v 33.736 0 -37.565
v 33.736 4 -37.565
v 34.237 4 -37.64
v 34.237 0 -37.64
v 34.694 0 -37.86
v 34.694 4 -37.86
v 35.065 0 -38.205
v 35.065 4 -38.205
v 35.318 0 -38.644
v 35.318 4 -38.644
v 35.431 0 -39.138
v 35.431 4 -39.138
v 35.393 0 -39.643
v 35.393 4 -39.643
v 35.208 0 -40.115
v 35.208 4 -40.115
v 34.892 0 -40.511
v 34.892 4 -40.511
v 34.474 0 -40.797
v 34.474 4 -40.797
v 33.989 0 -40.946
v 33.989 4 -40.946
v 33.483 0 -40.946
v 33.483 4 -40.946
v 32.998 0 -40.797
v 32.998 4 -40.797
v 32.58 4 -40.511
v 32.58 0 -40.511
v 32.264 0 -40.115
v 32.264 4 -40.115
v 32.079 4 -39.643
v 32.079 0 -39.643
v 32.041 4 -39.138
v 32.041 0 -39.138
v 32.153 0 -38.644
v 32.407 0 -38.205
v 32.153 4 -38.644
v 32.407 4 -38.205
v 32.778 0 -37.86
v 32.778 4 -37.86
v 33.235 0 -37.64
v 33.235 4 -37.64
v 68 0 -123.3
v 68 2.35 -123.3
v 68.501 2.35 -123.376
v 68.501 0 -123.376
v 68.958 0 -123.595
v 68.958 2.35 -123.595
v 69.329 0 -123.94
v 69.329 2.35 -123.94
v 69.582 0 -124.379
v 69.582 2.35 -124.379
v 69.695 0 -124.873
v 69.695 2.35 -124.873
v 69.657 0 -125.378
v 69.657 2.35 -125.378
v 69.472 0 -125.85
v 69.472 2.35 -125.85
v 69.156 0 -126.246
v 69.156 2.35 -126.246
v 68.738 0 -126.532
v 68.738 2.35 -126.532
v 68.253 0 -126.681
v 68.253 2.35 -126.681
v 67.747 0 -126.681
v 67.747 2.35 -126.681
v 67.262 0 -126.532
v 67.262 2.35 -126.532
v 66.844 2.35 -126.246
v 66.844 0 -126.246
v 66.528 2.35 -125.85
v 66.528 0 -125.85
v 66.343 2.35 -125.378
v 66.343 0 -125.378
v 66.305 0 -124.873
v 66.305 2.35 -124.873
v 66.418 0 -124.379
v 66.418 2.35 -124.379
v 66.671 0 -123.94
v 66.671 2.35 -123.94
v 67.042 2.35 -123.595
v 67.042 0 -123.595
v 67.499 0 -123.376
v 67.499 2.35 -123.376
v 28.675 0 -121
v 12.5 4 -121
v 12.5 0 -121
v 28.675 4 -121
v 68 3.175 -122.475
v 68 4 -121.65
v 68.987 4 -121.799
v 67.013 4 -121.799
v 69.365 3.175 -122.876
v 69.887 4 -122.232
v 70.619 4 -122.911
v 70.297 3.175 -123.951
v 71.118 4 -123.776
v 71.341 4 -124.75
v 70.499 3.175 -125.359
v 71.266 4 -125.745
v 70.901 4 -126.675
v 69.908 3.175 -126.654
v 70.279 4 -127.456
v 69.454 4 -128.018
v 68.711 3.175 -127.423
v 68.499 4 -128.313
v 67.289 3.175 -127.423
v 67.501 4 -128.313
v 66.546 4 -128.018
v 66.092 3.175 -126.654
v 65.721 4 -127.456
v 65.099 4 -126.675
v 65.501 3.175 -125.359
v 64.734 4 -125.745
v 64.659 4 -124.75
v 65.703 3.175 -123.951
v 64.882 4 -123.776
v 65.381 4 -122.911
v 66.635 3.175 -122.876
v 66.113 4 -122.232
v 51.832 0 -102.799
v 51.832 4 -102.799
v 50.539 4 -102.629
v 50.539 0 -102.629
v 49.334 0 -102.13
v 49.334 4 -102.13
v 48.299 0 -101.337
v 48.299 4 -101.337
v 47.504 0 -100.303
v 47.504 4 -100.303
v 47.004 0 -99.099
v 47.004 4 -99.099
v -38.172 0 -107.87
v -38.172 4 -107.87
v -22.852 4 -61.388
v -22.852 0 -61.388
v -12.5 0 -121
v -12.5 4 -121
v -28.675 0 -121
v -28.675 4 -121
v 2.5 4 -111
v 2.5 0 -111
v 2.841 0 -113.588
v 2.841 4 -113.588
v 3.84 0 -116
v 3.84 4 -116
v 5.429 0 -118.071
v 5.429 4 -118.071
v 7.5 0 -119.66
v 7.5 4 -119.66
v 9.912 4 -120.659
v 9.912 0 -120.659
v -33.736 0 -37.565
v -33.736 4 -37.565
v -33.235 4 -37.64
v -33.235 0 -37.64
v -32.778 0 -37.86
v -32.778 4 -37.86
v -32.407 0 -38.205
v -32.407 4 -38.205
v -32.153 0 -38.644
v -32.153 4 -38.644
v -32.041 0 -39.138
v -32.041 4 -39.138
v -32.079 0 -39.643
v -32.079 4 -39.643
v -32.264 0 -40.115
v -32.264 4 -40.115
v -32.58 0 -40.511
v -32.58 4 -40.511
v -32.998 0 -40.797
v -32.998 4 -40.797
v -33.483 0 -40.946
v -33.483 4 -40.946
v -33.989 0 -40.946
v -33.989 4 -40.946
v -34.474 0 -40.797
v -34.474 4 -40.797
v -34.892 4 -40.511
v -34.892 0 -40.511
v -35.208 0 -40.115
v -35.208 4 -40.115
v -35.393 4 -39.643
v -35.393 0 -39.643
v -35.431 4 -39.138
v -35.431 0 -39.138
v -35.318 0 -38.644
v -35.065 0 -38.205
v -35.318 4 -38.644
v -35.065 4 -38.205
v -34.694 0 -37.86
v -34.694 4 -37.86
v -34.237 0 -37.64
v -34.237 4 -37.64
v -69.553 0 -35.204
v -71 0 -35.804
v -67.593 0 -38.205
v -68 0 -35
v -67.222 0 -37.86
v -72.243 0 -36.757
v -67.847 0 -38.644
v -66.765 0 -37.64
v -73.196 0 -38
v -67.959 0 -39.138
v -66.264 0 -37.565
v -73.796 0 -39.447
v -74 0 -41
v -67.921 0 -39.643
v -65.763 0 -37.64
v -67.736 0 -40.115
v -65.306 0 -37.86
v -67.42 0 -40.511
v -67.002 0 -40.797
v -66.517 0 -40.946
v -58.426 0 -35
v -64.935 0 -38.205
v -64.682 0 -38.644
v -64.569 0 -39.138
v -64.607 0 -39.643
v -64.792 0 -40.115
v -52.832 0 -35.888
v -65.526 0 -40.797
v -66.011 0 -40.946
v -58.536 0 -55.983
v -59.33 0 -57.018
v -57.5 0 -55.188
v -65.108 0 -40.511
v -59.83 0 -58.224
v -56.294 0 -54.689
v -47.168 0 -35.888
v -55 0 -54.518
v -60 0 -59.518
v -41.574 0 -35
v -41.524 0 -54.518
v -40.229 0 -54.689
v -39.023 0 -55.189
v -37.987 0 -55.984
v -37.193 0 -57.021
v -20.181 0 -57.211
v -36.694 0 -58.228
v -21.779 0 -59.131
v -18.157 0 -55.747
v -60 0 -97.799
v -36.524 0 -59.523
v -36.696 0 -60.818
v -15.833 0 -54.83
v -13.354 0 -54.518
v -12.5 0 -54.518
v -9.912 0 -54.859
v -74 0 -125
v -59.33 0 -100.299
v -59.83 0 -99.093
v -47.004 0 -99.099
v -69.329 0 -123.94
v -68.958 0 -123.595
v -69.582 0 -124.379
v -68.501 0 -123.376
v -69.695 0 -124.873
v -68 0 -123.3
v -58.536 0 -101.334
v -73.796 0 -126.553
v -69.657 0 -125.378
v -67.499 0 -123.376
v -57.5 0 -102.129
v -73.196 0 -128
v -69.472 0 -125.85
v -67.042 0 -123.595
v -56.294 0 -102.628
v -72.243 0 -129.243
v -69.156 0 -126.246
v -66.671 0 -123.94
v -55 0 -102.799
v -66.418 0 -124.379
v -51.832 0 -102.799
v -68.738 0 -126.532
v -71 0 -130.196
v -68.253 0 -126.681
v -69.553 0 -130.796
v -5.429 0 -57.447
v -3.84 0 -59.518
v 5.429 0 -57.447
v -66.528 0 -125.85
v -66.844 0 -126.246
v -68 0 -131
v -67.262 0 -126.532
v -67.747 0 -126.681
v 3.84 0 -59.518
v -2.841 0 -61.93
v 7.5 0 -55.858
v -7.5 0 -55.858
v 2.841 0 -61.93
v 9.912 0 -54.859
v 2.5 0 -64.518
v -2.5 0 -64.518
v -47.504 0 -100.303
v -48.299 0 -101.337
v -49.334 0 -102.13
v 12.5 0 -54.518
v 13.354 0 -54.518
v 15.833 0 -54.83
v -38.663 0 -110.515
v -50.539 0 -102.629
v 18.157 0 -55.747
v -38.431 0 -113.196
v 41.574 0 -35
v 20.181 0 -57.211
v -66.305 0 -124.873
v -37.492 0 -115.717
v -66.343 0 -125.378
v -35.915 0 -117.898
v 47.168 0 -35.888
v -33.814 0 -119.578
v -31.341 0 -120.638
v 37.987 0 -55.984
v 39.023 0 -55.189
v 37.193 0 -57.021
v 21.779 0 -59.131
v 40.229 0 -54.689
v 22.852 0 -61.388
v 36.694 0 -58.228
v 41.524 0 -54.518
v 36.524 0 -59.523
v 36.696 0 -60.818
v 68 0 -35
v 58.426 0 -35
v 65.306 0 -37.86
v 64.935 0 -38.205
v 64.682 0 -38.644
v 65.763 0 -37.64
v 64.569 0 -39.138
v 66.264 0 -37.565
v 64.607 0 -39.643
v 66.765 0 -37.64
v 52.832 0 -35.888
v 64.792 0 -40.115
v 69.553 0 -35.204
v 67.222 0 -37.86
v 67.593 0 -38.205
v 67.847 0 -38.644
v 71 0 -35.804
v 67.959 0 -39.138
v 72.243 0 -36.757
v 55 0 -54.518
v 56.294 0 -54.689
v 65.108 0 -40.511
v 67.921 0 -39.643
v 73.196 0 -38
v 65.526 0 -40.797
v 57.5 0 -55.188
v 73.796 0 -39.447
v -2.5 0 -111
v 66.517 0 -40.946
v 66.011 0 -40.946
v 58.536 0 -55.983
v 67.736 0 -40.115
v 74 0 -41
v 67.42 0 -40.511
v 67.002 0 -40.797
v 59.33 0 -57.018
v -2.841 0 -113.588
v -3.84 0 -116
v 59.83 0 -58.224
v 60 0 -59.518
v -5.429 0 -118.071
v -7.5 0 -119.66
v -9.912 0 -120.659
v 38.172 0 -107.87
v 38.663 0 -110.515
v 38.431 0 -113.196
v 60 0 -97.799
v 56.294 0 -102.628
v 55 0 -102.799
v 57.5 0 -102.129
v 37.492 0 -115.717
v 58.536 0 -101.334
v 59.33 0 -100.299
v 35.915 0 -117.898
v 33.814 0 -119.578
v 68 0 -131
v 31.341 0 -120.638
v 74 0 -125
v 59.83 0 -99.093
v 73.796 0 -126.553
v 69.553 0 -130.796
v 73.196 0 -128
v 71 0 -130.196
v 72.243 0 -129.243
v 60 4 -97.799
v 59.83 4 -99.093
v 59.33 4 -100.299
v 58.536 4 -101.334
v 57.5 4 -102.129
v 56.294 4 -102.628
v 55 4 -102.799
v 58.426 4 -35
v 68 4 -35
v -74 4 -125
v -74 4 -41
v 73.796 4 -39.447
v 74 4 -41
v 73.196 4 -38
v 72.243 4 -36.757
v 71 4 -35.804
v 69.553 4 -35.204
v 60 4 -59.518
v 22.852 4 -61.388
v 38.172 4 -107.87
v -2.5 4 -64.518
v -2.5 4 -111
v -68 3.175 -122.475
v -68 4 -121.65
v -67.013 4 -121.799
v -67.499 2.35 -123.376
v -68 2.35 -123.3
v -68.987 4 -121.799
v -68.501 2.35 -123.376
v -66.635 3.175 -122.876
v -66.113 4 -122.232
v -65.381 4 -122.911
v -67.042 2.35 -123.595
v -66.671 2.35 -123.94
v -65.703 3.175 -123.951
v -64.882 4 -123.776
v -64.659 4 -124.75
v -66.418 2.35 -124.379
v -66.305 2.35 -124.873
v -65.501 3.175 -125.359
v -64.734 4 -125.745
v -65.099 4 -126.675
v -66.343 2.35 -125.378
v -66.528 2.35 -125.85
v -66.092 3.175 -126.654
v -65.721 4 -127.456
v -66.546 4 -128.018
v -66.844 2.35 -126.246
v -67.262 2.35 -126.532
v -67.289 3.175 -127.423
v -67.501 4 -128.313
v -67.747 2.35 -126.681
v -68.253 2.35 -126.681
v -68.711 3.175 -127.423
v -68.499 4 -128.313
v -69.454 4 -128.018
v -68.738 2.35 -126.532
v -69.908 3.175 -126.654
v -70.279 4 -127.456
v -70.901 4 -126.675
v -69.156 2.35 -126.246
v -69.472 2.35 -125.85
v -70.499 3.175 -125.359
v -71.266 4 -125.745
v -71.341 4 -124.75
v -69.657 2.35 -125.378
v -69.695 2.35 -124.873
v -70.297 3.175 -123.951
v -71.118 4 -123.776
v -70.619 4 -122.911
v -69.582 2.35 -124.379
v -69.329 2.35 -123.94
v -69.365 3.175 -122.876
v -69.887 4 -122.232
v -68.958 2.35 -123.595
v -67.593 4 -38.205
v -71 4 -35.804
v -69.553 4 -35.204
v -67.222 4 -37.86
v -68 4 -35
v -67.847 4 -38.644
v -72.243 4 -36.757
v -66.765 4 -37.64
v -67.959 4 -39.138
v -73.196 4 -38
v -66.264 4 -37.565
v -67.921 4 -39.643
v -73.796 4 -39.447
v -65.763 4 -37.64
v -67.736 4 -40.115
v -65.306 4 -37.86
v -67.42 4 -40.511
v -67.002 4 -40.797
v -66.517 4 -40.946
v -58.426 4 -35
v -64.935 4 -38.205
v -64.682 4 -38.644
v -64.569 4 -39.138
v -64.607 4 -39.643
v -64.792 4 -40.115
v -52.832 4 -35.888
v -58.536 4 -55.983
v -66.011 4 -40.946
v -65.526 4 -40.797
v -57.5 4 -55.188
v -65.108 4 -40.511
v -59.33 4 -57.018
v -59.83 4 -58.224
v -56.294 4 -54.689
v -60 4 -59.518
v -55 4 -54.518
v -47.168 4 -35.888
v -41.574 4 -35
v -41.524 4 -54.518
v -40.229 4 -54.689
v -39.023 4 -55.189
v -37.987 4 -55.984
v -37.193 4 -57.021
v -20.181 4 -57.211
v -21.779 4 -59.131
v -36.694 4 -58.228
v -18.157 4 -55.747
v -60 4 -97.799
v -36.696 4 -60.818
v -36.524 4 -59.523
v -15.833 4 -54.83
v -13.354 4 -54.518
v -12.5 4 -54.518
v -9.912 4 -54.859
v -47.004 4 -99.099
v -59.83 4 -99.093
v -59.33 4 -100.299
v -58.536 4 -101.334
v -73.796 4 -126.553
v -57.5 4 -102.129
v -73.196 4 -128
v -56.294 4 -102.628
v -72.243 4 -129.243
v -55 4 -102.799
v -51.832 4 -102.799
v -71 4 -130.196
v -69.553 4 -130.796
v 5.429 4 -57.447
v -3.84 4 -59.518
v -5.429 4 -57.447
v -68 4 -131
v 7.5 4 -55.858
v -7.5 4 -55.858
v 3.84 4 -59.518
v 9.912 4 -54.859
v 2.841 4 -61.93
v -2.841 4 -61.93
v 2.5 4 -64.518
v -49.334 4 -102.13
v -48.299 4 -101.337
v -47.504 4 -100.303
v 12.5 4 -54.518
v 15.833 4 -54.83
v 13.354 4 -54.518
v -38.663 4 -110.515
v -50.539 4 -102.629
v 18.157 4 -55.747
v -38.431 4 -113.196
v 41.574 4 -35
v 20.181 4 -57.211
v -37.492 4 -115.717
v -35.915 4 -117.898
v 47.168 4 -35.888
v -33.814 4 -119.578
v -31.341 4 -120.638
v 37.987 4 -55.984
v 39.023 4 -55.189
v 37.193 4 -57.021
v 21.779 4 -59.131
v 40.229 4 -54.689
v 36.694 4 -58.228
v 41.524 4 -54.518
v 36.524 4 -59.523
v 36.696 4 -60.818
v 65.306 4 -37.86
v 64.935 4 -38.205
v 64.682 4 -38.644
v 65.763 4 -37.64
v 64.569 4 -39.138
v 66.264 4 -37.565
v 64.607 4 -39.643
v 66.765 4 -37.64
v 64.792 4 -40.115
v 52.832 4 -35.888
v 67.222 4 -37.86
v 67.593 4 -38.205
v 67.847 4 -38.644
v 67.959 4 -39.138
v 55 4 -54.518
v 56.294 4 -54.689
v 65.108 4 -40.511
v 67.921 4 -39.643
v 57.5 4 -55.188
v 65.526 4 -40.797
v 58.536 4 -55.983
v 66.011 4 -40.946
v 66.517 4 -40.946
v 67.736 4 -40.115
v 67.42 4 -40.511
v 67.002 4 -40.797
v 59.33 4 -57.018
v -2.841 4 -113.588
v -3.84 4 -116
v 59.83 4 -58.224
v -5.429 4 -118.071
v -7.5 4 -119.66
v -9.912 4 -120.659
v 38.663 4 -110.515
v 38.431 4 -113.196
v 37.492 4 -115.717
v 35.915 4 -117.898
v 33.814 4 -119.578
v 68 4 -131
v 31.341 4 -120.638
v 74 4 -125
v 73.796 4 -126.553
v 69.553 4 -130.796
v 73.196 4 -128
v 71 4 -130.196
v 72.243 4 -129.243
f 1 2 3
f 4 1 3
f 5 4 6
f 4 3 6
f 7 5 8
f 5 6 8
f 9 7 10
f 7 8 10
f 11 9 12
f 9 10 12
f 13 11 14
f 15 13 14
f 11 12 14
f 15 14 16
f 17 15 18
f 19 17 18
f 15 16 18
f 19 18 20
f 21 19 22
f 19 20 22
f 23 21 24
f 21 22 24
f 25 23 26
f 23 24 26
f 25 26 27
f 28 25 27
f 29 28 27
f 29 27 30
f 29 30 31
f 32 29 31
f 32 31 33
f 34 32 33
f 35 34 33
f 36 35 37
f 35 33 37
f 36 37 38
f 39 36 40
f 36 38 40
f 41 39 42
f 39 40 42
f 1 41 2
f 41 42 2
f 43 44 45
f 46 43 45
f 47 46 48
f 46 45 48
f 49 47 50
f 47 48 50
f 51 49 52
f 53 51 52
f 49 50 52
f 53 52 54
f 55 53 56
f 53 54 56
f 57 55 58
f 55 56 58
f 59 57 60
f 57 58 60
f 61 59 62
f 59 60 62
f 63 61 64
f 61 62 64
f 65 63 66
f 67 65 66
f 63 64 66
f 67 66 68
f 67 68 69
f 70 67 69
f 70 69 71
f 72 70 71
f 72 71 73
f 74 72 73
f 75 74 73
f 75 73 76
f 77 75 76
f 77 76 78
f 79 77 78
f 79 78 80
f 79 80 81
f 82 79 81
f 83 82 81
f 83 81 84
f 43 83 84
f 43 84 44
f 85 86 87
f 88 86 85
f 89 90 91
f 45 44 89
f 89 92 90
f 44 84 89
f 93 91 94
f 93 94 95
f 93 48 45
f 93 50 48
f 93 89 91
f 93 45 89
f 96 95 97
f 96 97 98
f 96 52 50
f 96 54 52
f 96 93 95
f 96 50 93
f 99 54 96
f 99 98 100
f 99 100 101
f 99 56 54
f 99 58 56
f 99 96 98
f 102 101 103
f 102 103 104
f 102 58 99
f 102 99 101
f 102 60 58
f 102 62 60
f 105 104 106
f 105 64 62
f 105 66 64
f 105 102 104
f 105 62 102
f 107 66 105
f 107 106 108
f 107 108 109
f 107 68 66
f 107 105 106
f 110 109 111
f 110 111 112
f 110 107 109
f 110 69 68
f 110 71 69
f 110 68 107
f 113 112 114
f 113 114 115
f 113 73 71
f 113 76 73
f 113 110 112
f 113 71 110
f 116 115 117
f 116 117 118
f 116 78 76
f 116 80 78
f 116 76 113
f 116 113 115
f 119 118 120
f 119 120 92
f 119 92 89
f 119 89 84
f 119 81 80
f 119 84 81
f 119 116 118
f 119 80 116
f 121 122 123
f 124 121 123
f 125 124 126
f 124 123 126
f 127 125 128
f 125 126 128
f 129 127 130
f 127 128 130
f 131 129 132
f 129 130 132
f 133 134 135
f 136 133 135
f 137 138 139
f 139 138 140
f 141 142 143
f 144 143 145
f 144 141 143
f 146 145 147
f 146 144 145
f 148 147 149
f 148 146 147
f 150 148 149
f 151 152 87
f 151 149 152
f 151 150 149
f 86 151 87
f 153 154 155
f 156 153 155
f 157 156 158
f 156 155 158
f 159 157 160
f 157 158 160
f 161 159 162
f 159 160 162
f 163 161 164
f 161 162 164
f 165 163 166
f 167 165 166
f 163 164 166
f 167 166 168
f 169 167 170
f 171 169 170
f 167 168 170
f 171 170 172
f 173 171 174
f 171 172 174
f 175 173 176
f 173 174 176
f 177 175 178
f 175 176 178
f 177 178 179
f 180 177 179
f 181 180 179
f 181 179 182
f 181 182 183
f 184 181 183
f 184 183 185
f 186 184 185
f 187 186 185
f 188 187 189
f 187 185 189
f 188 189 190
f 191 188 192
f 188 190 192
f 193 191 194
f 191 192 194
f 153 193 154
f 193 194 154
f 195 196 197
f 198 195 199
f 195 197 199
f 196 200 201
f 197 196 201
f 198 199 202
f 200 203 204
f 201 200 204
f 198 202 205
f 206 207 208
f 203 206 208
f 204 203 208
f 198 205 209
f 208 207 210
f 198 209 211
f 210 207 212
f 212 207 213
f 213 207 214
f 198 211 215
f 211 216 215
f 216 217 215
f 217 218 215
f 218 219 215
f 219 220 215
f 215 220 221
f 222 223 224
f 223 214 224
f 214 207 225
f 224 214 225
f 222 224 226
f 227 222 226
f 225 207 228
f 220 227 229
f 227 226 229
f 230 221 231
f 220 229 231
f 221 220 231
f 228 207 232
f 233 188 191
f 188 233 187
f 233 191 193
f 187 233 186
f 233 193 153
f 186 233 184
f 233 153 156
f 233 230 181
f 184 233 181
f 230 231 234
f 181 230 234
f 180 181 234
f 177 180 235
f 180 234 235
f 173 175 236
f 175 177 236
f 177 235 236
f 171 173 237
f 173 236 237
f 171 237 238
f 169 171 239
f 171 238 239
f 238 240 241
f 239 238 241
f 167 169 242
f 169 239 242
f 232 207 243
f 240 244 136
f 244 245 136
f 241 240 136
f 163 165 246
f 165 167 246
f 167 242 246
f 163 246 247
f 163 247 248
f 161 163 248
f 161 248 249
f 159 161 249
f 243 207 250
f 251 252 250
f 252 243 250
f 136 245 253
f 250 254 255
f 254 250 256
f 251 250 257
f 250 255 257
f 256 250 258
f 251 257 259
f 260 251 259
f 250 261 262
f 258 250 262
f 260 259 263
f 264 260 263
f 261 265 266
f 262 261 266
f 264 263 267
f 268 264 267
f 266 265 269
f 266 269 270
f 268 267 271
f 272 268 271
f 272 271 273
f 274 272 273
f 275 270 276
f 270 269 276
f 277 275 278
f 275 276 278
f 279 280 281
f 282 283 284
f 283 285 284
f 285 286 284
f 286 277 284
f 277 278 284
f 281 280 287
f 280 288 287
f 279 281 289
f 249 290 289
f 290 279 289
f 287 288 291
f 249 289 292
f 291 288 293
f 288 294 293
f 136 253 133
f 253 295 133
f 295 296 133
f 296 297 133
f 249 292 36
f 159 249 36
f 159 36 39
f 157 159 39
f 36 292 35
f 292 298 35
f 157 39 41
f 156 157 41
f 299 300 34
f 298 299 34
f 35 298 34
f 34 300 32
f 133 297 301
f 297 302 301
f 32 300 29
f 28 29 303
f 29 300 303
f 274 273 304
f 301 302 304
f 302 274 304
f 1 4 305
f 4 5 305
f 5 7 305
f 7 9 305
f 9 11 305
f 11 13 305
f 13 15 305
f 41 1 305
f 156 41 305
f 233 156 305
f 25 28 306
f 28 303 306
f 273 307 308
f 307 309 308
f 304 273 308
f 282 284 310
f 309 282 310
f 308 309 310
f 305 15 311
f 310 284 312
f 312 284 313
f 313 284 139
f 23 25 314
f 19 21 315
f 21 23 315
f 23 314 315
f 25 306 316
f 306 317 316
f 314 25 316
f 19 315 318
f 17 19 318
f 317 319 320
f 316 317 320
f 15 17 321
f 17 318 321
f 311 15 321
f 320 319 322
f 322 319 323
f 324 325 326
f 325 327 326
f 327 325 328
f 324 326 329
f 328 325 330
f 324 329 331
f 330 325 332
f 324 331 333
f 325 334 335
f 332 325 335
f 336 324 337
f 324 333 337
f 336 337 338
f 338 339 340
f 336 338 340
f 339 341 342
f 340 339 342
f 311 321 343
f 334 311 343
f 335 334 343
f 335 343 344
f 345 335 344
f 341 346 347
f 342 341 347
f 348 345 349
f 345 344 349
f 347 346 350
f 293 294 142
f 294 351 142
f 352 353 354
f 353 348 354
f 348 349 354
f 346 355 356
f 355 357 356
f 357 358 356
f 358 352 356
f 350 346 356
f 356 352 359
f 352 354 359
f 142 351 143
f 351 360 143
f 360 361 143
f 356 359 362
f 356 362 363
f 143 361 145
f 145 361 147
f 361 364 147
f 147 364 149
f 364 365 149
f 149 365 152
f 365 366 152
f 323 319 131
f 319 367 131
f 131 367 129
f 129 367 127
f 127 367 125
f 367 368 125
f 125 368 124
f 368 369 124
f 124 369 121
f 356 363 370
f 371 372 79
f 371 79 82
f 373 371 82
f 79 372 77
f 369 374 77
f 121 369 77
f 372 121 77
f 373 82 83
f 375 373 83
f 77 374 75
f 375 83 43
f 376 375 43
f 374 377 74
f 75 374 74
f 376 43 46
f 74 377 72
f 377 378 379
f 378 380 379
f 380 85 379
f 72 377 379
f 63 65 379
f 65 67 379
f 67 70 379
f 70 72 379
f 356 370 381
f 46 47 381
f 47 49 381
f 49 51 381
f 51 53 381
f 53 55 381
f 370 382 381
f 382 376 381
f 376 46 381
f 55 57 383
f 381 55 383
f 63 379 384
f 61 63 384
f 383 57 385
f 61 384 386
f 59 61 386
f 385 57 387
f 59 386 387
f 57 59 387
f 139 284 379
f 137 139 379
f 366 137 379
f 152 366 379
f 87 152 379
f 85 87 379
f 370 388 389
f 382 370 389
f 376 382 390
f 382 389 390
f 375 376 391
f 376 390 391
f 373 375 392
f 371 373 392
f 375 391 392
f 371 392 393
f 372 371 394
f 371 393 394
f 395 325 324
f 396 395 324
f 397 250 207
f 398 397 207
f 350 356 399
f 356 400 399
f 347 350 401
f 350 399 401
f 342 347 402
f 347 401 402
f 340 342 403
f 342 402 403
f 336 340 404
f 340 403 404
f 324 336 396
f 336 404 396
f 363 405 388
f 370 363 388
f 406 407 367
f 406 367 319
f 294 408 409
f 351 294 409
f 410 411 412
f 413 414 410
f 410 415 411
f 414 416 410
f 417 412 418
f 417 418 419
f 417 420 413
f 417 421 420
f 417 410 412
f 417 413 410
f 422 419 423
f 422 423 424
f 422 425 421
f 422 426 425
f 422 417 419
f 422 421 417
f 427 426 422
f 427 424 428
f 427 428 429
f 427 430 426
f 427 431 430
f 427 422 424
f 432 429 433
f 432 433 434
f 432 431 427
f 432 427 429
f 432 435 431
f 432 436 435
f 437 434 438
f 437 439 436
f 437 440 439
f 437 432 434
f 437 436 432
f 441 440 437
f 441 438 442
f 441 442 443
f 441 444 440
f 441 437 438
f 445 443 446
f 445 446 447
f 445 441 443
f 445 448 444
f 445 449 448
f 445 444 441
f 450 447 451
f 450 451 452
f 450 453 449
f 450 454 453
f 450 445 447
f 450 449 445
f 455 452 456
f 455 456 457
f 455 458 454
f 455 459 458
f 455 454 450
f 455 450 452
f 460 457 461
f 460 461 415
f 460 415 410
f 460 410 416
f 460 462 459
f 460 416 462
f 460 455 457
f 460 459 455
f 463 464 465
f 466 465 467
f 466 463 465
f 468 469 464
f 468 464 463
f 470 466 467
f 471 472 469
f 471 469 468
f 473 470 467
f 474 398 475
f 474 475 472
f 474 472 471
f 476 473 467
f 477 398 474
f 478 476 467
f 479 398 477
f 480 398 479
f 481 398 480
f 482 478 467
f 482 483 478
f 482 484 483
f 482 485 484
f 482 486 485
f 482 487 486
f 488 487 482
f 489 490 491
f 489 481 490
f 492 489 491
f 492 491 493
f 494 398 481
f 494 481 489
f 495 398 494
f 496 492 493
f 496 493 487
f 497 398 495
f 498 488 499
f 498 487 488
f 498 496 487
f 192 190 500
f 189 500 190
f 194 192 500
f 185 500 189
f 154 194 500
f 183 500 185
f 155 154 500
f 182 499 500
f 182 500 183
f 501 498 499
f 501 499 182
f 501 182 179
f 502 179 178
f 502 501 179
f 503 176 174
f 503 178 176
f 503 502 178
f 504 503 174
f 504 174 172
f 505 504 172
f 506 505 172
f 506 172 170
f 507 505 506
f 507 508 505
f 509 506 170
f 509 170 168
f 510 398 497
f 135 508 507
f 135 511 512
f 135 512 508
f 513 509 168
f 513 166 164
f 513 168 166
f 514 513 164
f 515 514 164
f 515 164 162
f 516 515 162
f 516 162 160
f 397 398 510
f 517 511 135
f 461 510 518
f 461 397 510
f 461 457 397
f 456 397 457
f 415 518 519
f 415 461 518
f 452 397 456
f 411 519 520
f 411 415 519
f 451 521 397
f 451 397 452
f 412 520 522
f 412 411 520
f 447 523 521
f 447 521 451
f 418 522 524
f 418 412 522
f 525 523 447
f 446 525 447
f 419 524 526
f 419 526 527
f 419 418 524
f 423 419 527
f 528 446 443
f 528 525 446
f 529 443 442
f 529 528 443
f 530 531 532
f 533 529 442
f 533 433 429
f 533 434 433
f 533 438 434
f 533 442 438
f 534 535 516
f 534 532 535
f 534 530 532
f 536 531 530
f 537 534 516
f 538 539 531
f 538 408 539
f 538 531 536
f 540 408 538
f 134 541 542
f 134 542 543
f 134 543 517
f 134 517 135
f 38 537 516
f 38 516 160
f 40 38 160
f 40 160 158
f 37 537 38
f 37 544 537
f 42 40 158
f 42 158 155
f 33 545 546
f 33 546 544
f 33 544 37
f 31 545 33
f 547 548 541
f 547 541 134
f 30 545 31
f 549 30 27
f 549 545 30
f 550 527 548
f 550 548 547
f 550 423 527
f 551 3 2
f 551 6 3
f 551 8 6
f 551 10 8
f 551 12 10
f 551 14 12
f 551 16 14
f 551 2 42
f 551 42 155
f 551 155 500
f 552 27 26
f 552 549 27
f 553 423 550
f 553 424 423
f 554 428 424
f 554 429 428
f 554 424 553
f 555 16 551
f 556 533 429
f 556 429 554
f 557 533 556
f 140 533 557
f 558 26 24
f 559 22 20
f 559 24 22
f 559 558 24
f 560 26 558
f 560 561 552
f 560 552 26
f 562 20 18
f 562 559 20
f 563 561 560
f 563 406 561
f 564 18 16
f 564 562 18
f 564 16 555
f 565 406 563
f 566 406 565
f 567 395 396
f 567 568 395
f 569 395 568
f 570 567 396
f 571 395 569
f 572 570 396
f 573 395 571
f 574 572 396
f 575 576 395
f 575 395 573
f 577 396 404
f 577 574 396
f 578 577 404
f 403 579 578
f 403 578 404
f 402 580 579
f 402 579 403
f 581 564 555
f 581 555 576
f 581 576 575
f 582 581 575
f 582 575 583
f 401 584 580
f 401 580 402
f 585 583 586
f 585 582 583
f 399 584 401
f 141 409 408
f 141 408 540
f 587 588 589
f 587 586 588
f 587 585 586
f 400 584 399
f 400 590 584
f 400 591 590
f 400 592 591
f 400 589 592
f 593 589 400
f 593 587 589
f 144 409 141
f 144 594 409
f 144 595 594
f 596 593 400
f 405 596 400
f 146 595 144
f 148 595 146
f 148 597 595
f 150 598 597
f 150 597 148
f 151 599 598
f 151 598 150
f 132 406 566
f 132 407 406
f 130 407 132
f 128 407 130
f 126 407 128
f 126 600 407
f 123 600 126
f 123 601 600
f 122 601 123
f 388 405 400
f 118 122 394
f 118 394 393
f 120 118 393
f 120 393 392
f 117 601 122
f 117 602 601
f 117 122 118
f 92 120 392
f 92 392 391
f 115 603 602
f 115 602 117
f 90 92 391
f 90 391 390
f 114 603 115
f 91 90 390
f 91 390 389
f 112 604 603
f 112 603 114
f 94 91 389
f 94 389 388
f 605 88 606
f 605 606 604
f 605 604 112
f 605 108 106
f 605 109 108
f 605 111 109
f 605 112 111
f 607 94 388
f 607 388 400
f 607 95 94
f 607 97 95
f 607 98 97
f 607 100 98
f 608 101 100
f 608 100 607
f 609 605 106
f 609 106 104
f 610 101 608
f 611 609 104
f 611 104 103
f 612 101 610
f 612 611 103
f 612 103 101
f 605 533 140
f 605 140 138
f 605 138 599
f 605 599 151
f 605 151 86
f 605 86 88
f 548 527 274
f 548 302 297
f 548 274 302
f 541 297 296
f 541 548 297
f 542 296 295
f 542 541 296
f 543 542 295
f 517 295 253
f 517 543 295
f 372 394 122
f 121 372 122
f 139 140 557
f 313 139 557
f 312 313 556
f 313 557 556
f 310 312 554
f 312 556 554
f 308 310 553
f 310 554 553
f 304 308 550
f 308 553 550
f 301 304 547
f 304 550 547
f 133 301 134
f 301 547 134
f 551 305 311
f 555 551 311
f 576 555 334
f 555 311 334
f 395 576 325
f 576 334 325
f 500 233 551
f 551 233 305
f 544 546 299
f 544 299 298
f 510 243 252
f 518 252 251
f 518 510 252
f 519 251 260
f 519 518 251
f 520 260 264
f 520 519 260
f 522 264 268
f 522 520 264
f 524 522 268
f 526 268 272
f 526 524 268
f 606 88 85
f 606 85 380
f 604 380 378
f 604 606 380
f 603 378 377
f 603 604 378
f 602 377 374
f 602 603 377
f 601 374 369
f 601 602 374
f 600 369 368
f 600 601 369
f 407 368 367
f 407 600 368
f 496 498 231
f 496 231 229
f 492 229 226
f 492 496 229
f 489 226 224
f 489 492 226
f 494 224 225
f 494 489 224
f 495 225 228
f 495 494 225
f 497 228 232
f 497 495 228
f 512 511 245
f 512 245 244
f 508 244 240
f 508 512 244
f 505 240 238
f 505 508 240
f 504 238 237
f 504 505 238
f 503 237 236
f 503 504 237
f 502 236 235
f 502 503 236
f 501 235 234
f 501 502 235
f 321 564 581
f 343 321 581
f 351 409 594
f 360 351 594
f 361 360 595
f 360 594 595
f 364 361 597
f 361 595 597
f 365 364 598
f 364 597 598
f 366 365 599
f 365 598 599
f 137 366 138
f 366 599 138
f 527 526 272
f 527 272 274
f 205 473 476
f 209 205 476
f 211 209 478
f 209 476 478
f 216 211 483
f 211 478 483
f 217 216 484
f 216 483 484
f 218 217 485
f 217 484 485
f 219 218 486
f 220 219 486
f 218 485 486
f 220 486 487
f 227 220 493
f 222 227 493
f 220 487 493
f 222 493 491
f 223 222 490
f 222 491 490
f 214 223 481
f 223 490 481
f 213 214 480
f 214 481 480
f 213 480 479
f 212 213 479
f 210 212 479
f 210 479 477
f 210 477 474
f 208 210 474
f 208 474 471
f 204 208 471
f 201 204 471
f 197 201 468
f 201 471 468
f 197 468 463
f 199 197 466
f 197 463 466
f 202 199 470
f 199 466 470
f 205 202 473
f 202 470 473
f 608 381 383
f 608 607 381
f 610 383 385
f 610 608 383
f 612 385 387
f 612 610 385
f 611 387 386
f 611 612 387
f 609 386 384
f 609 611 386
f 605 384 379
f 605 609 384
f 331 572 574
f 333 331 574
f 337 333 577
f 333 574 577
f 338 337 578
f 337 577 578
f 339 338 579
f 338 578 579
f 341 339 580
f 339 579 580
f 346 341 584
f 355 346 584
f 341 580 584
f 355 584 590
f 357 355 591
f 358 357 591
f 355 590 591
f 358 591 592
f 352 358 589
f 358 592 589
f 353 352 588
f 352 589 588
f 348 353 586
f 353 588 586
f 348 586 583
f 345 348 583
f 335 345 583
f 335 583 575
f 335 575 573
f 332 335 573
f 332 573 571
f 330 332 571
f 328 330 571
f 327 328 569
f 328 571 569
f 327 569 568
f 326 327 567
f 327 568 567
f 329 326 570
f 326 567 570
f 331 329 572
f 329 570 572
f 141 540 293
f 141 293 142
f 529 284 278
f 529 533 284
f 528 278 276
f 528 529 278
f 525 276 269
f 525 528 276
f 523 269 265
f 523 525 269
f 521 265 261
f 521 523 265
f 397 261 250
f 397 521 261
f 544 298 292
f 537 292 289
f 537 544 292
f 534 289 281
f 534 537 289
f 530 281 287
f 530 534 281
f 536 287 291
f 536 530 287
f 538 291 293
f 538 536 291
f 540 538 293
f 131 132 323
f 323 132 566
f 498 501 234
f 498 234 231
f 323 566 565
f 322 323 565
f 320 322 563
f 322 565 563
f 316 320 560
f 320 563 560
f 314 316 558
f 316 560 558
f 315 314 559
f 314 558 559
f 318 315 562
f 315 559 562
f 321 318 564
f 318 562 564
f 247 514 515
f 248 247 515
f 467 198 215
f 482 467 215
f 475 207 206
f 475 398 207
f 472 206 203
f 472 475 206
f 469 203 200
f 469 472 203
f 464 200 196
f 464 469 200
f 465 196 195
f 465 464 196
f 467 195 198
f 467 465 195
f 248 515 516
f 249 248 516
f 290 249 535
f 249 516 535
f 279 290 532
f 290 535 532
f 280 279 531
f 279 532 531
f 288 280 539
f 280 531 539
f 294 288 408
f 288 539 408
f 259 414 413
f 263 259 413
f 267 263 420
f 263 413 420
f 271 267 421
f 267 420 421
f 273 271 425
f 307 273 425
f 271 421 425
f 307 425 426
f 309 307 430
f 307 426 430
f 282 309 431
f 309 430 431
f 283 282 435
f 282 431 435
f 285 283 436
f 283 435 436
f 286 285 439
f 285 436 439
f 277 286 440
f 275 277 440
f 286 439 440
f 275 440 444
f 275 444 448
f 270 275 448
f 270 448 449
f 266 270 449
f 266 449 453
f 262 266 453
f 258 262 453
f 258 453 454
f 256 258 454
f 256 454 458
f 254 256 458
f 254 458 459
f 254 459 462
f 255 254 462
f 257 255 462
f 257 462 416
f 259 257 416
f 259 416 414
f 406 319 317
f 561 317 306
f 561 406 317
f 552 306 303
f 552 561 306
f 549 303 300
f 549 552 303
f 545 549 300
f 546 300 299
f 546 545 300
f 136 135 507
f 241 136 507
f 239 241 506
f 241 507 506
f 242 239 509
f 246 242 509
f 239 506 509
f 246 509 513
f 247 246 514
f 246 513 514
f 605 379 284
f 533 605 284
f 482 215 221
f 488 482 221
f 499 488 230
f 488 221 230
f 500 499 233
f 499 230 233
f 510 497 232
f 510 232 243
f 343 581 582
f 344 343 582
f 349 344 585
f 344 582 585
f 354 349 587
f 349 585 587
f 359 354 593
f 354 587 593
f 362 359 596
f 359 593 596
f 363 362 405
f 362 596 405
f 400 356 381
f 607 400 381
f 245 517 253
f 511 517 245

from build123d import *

# Parameters (mm, degrees)
BOSS_EXTRUDE1_DEPTH = 4
SKETCH3_R           = 1.7
CUT_EXTRUDE1_DEPTH  = 4
FILLET1_R           = 6
SKETCH4_R           = 1.7
CUT_EXTRUDE2_DEPTH  = 10
CUT_EXTRUDE3_DEPTH  = 10
CHAMFER1_SIZE       = 1.65


with BuildPart() as part:
    # Sketch2 → Boss-Extrude1 (new body)
    with BuildSketch(Plane(origin=(0, 0, 0), x_dir=(1, 0, 0), z_dir=(0, 1, 0))):
        with BuildLine():
            Line((74, 35), (74, 131))
            Line((74, 131), (-74, 131))
            Line((-74, 131), (-74, 35))
            Line((-74, 35), (-58.426149773, 35))
            ThreePointArc((-58.426149773, 35), (-50, 36), (-41.573850227, 35))
            Line((-41.573850227, 35), (41.573850227, 35))
            ThreePointArc((41.573850227, 35), (50, 36), (58.426149773, 35))
            Line((58.426149773, 35), (74, 35))
        make_face()
    extrude(amount=BOSS_EXTRUDE1_DEPTH)

    # Sketch3 → Cut-Extrude1 (cut)
    with BuildSketch(Plane(origin=(0, 4, 0), x_dir=(1, 0, 0), z_dir=(0, 1, 0))):
        with Locations((-66.264045876, -39.264880132)):
            Circle(SKETCH3_R)
        with Locations(Location((-66.264045876, 39.264880132, 0), (0, 0, 270))):
            Circle(SKETCH3_R)
        with Locations(Location((-33.735954124, 39.264880132, 0), (0, 0, 270))):
            Circle(SKETCH3_R)
        with Locations((-10.735119868, 16.264045876)):
            Circle(SKETCH3_R)
        with Locations((-10.735119868, -16.264045876)):
            Circle(SKETCH3_R)
        with Locations((-33.735954124, -39.264880132)):
            Circle(SKETCH3_R)
        with Locations((10.735119868, 16.264045876)):
            Circle(SKETCH3_R)
        with Locations(Location((33.735954124, 39.264880132, 0), (0, 0, 270))):
            Circle(SKETCH3_R)
        with Locations(Location((66.264045876, 39.264880132, 0), (0, 0, 270))):
            Circle(SKETCH3_R)
        with Locations((10.735119868, -16.264045876)):
            Circle(SKETCH3_R)
        with Locations((33.735954124, -39.264880132)):
            Circle(SKETCH3_R)
        with Locations((66.264045876, -39.264880132)):
            Circle(SKETCH3_R)
    extrude(amount=-CUT_EXTRUDE1_DEPTH, mode=Mode.SUBTRACT)

    # Fillet1
    fillet1_edges = [part.edges().sort_by_distance(p)[0] for p in [
        (-74, 2, -131),
        (74, 2, -131),
        (74, 2, -35),
        (-74, 2, -35),
    ]]
    fillet(fillet1_edges, radius=FILLET1_R)

    # Sketch4 → Cut-Extrude2 (cut)
    with BuildSketch(Plane(origin=(0, 4, 0), x_dir=(1, 0, 0), z_dir=(0, 1, 0))):
        with Locations(Location((68, 125, 0), (0, 0, 270))):
            Circle(SKETCH4_R)
        with Locations(Location((-68, 125, 0), (0, 0, 270))):
            Circle(SKETCH4_R)
    extrude(amount=-CUT_EXTRUDE2_DEPTH, mode=Mode.SUBTRACT)

    # Sketch5 → Cut-Extrude3 (cut)
    with BuildSketch(Plane(origin=(0, 4, 0), x_dir=(1, 0, 0), z_dir=(0, 1, 0))):
        with BuildLine():
            Line((-12.5, 121), (-28.674783736, 121))
            ThreePointArc((-28.674783736, 121), (-36.777367456, 116.860728372), (-38.172192195, 107.86962741))
            Line((-38.172192195, 107.86962741), (-22.851640419, 61.387768193))
            ThreePointArc((-22.851640419, 61.387768193), (-19.214960332, 56.415557063), (-13.35423196, 54.518140784))
            Line((-13.35423196, 54.518140784), (-12.5, 54.518140784))
            ThreePointArc((-12.5, 54.518140784), (-5.428932188, 57.447072972), (-2.5, 64.518140784))
            Line((-2.5, 64.518140784), (-2.5, 111))
            ThreePointArc((-2.5, 111), (-5.428932188, 118.071067812), (-12.5, 121))
        make_face()
        with BuildLine():
            Line((-60, 59.518140784), (-60, 97.798571602))
            ThreePointArc((-60, 97.798571602), (-58.535533906, 101.334105508), (-55, 102.798571602))
            Line((-55, 102.798571602), (-51.831780224, 102.798571602))
            ThreePointArc((-51.831780224, 102.798571602), (-48.790398959, 101.767198569), (-47.003737142, 99.098571602))
            Line((-47.003737142, 99.098571602), (-36.696339461, 60.818140784))
            ThreePointArc((-36.696339461, 60.818140784), (-37.555755576, 56.476759519), (-41.524382543, 54.518140784))
            Line((-41.524382543, 54.518140784), (-55, 54.518140784))
            ThreePointArc((-55, 54.518140784), (-58.535533906, 55.982606878), (-60, 59.518140784))
        make_face()
    cut_extrude3 = extrude(amount=-CUT_EXTRUDE3_DEPTH, mode=Mode.SUBTRACT)

    # Mirror1: Cut-Extrude3 across plane
    add(cut_extrude3.mirror(Plane(origin=(0, 0, 0), x_dir=(0, 0, 1), z_dir=(1, 0, 0))), mode=Mode.SUBTRACT)

    # Chamfer1
    chamfer1_edges = [part.edges().sort_by_distance(p)[0] for p in [
        (-68, 4, -126.7),
        (68, 4, -126.7),
    ]]
    chamfer(chamfer1_edges, length=CHAMFER1_SIZE)


solid = part.part
